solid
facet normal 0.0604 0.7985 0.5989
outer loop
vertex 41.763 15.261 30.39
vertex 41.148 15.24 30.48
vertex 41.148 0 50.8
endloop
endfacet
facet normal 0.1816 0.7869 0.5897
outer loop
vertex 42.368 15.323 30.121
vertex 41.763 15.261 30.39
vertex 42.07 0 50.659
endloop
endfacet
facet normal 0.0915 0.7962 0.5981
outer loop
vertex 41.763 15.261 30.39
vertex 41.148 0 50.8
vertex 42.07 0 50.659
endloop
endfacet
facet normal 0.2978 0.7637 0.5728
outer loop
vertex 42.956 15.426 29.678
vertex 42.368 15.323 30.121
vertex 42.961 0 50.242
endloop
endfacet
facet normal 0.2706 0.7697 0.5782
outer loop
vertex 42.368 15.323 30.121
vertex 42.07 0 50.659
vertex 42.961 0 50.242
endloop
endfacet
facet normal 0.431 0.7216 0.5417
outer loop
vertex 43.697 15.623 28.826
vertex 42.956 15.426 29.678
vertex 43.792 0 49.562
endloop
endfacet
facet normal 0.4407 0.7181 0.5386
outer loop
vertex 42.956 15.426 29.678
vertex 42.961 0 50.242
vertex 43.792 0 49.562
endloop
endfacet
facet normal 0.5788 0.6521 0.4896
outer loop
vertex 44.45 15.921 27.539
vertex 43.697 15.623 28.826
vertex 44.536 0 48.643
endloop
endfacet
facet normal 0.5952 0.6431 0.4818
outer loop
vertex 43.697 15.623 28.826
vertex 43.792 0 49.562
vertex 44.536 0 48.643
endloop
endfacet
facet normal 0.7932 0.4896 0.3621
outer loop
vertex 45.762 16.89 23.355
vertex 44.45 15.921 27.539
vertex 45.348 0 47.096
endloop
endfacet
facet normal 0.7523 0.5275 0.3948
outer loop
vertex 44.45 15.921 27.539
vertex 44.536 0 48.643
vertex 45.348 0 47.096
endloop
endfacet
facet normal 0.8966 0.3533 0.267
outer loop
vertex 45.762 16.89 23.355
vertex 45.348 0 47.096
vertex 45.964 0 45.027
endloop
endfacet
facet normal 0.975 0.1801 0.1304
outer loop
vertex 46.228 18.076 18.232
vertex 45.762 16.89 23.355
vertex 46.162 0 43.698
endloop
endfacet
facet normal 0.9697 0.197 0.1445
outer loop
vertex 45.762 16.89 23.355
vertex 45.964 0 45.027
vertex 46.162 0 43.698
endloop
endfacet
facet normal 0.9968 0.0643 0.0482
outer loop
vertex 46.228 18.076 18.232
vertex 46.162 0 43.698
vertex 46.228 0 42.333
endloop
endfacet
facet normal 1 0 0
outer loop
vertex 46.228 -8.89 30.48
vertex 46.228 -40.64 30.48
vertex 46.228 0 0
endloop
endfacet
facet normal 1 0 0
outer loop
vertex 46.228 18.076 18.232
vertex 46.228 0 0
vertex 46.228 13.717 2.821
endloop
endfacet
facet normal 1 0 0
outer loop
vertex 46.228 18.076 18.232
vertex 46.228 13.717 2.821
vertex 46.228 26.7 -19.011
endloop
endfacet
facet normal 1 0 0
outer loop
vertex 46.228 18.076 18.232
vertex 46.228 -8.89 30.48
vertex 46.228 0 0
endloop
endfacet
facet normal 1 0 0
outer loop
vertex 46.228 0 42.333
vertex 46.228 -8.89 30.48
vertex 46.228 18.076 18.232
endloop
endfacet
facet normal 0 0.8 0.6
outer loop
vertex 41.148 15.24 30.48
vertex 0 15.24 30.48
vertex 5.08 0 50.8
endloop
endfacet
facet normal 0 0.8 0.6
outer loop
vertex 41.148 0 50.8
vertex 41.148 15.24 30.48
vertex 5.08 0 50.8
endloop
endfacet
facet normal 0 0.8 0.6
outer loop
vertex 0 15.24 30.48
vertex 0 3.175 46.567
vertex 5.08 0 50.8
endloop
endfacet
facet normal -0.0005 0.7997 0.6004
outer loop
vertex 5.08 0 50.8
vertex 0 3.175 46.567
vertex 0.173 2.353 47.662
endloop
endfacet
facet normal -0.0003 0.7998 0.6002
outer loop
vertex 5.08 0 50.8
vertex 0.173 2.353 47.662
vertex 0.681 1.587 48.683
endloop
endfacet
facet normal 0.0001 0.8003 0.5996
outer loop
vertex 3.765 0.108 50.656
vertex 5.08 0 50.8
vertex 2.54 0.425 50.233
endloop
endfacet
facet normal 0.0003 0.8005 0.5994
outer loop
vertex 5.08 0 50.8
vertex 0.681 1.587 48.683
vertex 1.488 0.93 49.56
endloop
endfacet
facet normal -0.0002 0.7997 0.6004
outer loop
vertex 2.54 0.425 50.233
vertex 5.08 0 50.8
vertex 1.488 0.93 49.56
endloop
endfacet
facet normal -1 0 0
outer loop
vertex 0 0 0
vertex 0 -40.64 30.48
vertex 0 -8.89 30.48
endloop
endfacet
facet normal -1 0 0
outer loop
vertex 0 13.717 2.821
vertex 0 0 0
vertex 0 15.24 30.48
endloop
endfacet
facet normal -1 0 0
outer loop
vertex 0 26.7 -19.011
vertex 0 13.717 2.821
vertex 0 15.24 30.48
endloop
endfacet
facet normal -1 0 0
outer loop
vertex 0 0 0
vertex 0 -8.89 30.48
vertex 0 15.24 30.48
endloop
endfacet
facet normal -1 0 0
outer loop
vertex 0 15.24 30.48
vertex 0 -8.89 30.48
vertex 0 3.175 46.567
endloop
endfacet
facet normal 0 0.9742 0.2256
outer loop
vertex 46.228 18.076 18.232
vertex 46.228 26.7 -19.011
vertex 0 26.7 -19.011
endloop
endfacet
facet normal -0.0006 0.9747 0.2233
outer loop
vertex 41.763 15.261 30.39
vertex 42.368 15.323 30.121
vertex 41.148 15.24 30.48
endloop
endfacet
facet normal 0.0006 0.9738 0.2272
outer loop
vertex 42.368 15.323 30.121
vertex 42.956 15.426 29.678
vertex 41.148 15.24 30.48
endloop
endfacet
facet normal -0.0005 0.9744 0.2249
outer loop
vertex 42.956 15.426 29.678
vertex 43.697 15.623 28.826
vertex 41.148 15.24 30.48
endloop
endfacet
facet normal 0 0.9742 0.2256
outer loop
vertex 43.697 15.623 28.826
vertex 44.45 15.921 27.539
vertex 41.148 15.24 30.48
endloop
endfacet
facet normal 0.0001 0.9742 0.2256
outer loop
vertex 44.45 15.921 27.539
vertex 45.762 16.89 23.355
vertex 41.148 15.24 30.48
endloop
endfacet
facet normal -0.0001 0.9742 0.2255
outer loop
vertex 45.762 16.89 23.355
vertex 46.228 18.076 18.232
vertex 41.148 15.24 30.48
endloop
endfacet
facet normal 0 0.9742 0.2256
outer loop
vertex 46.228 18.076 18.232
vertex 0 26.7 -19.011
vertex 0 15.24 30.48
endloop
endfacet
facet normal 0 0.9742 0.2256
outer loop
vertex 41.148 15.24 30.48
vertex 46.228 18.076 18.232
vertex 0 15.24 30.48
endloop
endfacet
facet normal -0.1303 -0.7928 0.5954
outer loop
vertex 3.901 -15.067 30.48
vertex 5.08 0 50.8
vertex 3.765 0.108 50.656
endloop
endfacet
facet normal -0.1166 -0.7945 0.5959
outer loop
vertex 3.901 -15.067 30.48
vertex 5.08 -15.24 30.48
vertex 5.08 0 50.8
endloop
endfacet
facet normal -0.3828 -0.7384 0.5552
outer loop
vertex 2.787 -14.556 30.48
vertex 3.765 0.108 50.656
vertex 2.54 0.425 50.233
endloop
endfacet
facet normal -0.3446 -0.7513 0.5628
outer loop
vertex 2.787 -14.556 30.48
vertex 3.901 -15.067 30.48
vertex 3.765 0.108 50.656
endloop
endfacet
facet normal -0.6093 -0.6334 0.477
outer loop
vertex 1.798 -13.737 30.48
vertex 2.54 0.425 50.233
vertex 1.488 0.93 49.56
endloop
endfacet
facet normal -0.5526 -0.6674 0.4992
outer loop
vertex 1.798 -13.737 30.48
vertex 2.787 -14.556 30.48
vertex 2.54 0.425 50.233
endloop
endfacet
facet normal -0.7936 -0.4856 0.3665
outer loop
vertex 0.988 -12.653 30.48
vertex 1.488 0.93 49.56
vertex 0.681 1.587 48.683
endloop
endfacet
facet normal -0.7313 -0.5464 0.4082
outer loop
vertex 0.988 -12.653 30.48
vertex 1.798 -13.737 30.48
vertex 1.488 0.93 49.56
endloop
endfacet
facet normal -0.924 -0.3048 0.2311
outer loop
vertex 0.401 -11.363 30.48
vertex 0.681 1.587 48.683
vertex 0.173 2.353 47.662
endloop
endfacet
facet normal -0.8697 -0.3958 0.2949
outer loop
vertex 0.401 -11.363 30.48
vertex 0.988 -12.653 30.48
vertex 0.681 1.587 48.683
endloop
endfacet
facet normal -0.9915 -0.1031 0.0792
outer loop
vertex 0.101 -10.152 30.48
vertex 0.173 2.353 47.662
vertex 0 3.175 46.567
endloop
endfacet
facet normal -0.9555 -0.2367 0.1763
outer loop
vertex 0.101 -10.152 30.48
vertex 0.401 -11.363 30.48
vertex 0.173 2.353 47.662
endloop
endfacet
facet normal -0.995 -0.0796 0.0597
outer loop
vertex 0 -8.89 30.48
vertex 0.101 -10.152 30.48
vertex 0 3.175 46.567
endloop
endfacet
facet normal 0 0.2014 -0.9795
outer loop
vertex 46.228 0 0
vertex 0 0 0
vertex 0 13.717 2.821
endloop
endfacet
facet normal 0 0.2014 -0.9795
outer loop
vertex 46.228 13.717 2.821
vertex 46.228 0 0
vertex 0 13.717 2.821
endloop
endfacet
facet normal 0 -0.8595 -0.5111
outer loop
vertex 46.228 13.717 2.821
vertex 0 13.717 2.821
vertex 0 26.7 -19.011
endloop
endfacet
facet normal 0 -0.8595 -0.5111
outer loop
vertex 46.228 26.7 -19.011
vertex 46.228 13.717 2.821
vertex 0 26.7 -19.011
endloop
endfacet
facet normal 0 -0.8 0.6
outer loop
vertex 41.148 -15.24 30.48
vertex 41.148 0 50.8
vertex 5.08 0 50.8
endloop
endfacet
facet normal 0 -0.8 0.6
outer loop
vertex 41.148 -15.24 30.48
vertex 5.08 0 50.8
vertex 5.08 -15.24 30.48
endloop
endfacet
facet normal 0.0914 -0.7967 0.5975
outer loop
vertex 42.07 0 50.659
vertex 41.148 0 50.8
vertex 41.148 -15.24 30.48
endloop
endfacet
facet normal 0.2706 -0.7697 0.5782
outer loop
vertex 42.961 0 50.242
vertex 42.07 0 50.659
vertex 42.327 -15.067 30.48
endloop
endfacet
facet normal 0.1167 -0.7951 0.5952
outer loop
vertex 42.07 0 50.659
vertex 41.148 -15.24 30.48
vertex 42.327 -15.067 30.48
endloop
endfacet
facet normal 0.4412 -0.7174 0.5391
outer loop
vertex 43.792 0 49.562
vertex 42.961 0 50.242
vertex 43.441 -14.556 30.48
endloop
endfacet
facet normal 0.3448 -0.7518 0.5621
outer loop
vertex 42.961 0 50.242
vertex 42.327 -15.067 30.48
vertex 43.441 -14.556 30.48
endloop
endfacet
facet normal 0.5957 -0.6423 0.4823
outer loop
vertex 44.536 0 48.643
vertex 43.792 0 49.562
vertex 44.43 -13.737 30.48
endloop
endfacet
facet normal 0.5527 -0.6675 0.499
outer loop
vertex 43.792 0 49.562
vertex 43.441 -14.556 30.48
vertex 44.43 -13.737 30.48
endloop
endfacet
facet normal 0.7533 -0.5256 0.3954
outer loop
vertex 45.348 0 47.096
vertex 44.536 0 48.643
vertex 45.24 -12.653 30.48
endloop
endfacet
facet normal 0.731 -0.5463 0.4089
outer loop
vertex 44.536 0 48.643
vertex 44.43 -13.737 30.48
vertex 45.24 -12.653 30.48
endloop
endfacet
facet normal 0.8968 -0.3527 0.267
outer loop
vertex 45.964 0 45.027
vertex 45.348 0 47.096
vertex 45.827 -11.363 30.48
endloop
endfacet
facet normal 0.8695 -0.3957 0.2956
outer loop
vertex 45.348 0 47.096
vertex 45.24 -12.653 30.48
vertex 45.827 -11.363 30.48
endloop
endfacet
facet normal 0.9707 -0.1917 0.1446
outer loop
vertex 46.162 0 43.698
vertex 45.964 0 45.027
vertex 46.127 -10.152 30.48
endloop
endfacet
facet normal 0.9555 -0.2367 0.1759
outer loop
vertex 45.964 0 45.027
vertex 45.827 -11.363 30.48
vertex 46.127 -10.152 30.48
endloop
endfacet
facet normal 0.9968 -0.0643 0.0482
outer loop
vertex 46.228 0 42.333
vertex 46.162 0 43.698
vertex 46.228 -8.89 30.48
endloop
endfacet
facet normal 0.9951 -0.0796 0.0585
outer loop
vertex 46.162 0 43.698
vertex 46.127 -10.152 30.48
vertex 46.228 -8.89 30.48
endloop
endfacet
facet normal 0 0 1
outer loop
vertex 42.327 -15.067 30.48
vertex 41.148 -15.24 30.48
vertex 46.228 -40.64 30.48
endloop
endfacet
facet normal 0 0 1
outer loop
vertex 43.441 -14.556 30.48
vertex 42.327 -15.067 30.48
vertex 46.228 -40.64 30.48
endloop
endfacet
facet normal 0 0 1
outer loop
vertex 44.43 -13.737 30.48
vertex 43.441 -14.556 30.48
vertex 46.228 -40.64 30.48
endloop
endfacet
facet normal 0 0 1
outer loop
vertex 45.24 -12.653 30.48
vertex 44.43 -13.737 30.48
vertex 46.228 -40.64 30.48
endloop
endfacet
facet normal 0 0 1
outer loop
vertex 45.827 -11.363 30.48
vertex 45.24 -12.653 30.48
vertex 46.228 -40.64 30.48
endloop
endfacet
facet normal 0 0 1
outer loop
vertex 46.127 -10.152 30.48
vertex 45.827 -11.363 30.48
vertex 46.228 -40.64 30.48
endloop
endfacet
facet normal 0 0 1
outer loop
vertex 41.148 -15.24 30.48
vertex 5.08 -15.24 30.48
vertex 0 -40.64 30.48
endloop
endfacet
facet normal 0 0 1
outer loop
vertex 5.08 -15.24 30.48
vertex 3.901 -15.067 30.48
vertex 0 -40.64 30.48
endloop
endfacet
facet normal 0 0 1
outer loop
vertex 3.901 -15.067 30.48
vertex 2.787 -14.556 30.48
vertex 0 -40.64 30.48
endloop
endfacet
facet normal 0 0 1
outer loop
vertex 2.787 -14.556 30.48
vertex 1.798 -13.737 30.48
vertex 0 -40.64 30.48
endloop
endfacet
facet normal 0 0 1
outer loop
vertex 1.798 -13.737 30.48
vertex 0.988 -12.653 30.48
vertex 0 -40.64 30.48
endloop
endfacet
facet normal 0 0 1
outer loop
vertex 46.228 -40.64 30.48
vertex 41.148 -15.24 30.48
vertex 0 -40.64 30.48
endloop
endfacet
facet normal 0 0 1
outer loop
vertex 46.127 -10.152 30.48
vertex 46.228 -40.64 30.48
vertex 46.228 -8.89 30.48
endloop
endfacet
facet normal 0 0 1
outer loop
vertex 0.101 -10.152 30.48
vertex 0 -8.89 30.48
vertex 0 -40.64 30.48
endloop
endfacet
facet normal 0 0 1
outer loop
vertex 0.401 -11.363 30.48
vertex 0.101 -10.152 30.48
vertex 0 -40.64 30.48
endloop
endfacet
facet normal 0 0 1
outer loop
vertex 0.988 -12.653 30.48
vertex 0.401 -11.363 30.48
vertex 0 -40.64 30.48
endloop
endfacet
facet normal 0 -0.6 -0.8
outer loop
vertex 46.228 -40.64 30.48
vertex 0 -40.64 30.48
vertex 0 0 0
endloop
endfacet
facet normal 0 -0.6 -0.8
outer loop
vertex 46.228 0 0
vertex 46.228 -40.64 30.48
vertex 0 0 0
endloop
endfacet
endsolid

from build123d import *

# Parameters (mm, degrees)
F1_DEPTH = 46.228
F2_R     = 5.08


with BuildPart() as f1:
    # F0 (on Right) → F1 (new body)
    with BuildSketch(Plane.YZ):
        Polygon((-14.183068, 10.637301), (0, 0), (13.716886, 2.820693), (26.699892, -19.010513), (15.24, 30.48), (0, 50.8), (-15.24, 30.48), (-40.64, 30.48), align=None)
    extrude(amount=F1_DEPTH)

    # F2
    f2_edges = [f1.edges().sort_by_distance(p)[0] for p in [
        (0, -7.62, 40.64),
        (46.228, -7.62, 40.64),
        (46.228, 7.62, 40.64),
    ]]
    fillet(f2_edges, radius=F2_R)


solid = f1.part
